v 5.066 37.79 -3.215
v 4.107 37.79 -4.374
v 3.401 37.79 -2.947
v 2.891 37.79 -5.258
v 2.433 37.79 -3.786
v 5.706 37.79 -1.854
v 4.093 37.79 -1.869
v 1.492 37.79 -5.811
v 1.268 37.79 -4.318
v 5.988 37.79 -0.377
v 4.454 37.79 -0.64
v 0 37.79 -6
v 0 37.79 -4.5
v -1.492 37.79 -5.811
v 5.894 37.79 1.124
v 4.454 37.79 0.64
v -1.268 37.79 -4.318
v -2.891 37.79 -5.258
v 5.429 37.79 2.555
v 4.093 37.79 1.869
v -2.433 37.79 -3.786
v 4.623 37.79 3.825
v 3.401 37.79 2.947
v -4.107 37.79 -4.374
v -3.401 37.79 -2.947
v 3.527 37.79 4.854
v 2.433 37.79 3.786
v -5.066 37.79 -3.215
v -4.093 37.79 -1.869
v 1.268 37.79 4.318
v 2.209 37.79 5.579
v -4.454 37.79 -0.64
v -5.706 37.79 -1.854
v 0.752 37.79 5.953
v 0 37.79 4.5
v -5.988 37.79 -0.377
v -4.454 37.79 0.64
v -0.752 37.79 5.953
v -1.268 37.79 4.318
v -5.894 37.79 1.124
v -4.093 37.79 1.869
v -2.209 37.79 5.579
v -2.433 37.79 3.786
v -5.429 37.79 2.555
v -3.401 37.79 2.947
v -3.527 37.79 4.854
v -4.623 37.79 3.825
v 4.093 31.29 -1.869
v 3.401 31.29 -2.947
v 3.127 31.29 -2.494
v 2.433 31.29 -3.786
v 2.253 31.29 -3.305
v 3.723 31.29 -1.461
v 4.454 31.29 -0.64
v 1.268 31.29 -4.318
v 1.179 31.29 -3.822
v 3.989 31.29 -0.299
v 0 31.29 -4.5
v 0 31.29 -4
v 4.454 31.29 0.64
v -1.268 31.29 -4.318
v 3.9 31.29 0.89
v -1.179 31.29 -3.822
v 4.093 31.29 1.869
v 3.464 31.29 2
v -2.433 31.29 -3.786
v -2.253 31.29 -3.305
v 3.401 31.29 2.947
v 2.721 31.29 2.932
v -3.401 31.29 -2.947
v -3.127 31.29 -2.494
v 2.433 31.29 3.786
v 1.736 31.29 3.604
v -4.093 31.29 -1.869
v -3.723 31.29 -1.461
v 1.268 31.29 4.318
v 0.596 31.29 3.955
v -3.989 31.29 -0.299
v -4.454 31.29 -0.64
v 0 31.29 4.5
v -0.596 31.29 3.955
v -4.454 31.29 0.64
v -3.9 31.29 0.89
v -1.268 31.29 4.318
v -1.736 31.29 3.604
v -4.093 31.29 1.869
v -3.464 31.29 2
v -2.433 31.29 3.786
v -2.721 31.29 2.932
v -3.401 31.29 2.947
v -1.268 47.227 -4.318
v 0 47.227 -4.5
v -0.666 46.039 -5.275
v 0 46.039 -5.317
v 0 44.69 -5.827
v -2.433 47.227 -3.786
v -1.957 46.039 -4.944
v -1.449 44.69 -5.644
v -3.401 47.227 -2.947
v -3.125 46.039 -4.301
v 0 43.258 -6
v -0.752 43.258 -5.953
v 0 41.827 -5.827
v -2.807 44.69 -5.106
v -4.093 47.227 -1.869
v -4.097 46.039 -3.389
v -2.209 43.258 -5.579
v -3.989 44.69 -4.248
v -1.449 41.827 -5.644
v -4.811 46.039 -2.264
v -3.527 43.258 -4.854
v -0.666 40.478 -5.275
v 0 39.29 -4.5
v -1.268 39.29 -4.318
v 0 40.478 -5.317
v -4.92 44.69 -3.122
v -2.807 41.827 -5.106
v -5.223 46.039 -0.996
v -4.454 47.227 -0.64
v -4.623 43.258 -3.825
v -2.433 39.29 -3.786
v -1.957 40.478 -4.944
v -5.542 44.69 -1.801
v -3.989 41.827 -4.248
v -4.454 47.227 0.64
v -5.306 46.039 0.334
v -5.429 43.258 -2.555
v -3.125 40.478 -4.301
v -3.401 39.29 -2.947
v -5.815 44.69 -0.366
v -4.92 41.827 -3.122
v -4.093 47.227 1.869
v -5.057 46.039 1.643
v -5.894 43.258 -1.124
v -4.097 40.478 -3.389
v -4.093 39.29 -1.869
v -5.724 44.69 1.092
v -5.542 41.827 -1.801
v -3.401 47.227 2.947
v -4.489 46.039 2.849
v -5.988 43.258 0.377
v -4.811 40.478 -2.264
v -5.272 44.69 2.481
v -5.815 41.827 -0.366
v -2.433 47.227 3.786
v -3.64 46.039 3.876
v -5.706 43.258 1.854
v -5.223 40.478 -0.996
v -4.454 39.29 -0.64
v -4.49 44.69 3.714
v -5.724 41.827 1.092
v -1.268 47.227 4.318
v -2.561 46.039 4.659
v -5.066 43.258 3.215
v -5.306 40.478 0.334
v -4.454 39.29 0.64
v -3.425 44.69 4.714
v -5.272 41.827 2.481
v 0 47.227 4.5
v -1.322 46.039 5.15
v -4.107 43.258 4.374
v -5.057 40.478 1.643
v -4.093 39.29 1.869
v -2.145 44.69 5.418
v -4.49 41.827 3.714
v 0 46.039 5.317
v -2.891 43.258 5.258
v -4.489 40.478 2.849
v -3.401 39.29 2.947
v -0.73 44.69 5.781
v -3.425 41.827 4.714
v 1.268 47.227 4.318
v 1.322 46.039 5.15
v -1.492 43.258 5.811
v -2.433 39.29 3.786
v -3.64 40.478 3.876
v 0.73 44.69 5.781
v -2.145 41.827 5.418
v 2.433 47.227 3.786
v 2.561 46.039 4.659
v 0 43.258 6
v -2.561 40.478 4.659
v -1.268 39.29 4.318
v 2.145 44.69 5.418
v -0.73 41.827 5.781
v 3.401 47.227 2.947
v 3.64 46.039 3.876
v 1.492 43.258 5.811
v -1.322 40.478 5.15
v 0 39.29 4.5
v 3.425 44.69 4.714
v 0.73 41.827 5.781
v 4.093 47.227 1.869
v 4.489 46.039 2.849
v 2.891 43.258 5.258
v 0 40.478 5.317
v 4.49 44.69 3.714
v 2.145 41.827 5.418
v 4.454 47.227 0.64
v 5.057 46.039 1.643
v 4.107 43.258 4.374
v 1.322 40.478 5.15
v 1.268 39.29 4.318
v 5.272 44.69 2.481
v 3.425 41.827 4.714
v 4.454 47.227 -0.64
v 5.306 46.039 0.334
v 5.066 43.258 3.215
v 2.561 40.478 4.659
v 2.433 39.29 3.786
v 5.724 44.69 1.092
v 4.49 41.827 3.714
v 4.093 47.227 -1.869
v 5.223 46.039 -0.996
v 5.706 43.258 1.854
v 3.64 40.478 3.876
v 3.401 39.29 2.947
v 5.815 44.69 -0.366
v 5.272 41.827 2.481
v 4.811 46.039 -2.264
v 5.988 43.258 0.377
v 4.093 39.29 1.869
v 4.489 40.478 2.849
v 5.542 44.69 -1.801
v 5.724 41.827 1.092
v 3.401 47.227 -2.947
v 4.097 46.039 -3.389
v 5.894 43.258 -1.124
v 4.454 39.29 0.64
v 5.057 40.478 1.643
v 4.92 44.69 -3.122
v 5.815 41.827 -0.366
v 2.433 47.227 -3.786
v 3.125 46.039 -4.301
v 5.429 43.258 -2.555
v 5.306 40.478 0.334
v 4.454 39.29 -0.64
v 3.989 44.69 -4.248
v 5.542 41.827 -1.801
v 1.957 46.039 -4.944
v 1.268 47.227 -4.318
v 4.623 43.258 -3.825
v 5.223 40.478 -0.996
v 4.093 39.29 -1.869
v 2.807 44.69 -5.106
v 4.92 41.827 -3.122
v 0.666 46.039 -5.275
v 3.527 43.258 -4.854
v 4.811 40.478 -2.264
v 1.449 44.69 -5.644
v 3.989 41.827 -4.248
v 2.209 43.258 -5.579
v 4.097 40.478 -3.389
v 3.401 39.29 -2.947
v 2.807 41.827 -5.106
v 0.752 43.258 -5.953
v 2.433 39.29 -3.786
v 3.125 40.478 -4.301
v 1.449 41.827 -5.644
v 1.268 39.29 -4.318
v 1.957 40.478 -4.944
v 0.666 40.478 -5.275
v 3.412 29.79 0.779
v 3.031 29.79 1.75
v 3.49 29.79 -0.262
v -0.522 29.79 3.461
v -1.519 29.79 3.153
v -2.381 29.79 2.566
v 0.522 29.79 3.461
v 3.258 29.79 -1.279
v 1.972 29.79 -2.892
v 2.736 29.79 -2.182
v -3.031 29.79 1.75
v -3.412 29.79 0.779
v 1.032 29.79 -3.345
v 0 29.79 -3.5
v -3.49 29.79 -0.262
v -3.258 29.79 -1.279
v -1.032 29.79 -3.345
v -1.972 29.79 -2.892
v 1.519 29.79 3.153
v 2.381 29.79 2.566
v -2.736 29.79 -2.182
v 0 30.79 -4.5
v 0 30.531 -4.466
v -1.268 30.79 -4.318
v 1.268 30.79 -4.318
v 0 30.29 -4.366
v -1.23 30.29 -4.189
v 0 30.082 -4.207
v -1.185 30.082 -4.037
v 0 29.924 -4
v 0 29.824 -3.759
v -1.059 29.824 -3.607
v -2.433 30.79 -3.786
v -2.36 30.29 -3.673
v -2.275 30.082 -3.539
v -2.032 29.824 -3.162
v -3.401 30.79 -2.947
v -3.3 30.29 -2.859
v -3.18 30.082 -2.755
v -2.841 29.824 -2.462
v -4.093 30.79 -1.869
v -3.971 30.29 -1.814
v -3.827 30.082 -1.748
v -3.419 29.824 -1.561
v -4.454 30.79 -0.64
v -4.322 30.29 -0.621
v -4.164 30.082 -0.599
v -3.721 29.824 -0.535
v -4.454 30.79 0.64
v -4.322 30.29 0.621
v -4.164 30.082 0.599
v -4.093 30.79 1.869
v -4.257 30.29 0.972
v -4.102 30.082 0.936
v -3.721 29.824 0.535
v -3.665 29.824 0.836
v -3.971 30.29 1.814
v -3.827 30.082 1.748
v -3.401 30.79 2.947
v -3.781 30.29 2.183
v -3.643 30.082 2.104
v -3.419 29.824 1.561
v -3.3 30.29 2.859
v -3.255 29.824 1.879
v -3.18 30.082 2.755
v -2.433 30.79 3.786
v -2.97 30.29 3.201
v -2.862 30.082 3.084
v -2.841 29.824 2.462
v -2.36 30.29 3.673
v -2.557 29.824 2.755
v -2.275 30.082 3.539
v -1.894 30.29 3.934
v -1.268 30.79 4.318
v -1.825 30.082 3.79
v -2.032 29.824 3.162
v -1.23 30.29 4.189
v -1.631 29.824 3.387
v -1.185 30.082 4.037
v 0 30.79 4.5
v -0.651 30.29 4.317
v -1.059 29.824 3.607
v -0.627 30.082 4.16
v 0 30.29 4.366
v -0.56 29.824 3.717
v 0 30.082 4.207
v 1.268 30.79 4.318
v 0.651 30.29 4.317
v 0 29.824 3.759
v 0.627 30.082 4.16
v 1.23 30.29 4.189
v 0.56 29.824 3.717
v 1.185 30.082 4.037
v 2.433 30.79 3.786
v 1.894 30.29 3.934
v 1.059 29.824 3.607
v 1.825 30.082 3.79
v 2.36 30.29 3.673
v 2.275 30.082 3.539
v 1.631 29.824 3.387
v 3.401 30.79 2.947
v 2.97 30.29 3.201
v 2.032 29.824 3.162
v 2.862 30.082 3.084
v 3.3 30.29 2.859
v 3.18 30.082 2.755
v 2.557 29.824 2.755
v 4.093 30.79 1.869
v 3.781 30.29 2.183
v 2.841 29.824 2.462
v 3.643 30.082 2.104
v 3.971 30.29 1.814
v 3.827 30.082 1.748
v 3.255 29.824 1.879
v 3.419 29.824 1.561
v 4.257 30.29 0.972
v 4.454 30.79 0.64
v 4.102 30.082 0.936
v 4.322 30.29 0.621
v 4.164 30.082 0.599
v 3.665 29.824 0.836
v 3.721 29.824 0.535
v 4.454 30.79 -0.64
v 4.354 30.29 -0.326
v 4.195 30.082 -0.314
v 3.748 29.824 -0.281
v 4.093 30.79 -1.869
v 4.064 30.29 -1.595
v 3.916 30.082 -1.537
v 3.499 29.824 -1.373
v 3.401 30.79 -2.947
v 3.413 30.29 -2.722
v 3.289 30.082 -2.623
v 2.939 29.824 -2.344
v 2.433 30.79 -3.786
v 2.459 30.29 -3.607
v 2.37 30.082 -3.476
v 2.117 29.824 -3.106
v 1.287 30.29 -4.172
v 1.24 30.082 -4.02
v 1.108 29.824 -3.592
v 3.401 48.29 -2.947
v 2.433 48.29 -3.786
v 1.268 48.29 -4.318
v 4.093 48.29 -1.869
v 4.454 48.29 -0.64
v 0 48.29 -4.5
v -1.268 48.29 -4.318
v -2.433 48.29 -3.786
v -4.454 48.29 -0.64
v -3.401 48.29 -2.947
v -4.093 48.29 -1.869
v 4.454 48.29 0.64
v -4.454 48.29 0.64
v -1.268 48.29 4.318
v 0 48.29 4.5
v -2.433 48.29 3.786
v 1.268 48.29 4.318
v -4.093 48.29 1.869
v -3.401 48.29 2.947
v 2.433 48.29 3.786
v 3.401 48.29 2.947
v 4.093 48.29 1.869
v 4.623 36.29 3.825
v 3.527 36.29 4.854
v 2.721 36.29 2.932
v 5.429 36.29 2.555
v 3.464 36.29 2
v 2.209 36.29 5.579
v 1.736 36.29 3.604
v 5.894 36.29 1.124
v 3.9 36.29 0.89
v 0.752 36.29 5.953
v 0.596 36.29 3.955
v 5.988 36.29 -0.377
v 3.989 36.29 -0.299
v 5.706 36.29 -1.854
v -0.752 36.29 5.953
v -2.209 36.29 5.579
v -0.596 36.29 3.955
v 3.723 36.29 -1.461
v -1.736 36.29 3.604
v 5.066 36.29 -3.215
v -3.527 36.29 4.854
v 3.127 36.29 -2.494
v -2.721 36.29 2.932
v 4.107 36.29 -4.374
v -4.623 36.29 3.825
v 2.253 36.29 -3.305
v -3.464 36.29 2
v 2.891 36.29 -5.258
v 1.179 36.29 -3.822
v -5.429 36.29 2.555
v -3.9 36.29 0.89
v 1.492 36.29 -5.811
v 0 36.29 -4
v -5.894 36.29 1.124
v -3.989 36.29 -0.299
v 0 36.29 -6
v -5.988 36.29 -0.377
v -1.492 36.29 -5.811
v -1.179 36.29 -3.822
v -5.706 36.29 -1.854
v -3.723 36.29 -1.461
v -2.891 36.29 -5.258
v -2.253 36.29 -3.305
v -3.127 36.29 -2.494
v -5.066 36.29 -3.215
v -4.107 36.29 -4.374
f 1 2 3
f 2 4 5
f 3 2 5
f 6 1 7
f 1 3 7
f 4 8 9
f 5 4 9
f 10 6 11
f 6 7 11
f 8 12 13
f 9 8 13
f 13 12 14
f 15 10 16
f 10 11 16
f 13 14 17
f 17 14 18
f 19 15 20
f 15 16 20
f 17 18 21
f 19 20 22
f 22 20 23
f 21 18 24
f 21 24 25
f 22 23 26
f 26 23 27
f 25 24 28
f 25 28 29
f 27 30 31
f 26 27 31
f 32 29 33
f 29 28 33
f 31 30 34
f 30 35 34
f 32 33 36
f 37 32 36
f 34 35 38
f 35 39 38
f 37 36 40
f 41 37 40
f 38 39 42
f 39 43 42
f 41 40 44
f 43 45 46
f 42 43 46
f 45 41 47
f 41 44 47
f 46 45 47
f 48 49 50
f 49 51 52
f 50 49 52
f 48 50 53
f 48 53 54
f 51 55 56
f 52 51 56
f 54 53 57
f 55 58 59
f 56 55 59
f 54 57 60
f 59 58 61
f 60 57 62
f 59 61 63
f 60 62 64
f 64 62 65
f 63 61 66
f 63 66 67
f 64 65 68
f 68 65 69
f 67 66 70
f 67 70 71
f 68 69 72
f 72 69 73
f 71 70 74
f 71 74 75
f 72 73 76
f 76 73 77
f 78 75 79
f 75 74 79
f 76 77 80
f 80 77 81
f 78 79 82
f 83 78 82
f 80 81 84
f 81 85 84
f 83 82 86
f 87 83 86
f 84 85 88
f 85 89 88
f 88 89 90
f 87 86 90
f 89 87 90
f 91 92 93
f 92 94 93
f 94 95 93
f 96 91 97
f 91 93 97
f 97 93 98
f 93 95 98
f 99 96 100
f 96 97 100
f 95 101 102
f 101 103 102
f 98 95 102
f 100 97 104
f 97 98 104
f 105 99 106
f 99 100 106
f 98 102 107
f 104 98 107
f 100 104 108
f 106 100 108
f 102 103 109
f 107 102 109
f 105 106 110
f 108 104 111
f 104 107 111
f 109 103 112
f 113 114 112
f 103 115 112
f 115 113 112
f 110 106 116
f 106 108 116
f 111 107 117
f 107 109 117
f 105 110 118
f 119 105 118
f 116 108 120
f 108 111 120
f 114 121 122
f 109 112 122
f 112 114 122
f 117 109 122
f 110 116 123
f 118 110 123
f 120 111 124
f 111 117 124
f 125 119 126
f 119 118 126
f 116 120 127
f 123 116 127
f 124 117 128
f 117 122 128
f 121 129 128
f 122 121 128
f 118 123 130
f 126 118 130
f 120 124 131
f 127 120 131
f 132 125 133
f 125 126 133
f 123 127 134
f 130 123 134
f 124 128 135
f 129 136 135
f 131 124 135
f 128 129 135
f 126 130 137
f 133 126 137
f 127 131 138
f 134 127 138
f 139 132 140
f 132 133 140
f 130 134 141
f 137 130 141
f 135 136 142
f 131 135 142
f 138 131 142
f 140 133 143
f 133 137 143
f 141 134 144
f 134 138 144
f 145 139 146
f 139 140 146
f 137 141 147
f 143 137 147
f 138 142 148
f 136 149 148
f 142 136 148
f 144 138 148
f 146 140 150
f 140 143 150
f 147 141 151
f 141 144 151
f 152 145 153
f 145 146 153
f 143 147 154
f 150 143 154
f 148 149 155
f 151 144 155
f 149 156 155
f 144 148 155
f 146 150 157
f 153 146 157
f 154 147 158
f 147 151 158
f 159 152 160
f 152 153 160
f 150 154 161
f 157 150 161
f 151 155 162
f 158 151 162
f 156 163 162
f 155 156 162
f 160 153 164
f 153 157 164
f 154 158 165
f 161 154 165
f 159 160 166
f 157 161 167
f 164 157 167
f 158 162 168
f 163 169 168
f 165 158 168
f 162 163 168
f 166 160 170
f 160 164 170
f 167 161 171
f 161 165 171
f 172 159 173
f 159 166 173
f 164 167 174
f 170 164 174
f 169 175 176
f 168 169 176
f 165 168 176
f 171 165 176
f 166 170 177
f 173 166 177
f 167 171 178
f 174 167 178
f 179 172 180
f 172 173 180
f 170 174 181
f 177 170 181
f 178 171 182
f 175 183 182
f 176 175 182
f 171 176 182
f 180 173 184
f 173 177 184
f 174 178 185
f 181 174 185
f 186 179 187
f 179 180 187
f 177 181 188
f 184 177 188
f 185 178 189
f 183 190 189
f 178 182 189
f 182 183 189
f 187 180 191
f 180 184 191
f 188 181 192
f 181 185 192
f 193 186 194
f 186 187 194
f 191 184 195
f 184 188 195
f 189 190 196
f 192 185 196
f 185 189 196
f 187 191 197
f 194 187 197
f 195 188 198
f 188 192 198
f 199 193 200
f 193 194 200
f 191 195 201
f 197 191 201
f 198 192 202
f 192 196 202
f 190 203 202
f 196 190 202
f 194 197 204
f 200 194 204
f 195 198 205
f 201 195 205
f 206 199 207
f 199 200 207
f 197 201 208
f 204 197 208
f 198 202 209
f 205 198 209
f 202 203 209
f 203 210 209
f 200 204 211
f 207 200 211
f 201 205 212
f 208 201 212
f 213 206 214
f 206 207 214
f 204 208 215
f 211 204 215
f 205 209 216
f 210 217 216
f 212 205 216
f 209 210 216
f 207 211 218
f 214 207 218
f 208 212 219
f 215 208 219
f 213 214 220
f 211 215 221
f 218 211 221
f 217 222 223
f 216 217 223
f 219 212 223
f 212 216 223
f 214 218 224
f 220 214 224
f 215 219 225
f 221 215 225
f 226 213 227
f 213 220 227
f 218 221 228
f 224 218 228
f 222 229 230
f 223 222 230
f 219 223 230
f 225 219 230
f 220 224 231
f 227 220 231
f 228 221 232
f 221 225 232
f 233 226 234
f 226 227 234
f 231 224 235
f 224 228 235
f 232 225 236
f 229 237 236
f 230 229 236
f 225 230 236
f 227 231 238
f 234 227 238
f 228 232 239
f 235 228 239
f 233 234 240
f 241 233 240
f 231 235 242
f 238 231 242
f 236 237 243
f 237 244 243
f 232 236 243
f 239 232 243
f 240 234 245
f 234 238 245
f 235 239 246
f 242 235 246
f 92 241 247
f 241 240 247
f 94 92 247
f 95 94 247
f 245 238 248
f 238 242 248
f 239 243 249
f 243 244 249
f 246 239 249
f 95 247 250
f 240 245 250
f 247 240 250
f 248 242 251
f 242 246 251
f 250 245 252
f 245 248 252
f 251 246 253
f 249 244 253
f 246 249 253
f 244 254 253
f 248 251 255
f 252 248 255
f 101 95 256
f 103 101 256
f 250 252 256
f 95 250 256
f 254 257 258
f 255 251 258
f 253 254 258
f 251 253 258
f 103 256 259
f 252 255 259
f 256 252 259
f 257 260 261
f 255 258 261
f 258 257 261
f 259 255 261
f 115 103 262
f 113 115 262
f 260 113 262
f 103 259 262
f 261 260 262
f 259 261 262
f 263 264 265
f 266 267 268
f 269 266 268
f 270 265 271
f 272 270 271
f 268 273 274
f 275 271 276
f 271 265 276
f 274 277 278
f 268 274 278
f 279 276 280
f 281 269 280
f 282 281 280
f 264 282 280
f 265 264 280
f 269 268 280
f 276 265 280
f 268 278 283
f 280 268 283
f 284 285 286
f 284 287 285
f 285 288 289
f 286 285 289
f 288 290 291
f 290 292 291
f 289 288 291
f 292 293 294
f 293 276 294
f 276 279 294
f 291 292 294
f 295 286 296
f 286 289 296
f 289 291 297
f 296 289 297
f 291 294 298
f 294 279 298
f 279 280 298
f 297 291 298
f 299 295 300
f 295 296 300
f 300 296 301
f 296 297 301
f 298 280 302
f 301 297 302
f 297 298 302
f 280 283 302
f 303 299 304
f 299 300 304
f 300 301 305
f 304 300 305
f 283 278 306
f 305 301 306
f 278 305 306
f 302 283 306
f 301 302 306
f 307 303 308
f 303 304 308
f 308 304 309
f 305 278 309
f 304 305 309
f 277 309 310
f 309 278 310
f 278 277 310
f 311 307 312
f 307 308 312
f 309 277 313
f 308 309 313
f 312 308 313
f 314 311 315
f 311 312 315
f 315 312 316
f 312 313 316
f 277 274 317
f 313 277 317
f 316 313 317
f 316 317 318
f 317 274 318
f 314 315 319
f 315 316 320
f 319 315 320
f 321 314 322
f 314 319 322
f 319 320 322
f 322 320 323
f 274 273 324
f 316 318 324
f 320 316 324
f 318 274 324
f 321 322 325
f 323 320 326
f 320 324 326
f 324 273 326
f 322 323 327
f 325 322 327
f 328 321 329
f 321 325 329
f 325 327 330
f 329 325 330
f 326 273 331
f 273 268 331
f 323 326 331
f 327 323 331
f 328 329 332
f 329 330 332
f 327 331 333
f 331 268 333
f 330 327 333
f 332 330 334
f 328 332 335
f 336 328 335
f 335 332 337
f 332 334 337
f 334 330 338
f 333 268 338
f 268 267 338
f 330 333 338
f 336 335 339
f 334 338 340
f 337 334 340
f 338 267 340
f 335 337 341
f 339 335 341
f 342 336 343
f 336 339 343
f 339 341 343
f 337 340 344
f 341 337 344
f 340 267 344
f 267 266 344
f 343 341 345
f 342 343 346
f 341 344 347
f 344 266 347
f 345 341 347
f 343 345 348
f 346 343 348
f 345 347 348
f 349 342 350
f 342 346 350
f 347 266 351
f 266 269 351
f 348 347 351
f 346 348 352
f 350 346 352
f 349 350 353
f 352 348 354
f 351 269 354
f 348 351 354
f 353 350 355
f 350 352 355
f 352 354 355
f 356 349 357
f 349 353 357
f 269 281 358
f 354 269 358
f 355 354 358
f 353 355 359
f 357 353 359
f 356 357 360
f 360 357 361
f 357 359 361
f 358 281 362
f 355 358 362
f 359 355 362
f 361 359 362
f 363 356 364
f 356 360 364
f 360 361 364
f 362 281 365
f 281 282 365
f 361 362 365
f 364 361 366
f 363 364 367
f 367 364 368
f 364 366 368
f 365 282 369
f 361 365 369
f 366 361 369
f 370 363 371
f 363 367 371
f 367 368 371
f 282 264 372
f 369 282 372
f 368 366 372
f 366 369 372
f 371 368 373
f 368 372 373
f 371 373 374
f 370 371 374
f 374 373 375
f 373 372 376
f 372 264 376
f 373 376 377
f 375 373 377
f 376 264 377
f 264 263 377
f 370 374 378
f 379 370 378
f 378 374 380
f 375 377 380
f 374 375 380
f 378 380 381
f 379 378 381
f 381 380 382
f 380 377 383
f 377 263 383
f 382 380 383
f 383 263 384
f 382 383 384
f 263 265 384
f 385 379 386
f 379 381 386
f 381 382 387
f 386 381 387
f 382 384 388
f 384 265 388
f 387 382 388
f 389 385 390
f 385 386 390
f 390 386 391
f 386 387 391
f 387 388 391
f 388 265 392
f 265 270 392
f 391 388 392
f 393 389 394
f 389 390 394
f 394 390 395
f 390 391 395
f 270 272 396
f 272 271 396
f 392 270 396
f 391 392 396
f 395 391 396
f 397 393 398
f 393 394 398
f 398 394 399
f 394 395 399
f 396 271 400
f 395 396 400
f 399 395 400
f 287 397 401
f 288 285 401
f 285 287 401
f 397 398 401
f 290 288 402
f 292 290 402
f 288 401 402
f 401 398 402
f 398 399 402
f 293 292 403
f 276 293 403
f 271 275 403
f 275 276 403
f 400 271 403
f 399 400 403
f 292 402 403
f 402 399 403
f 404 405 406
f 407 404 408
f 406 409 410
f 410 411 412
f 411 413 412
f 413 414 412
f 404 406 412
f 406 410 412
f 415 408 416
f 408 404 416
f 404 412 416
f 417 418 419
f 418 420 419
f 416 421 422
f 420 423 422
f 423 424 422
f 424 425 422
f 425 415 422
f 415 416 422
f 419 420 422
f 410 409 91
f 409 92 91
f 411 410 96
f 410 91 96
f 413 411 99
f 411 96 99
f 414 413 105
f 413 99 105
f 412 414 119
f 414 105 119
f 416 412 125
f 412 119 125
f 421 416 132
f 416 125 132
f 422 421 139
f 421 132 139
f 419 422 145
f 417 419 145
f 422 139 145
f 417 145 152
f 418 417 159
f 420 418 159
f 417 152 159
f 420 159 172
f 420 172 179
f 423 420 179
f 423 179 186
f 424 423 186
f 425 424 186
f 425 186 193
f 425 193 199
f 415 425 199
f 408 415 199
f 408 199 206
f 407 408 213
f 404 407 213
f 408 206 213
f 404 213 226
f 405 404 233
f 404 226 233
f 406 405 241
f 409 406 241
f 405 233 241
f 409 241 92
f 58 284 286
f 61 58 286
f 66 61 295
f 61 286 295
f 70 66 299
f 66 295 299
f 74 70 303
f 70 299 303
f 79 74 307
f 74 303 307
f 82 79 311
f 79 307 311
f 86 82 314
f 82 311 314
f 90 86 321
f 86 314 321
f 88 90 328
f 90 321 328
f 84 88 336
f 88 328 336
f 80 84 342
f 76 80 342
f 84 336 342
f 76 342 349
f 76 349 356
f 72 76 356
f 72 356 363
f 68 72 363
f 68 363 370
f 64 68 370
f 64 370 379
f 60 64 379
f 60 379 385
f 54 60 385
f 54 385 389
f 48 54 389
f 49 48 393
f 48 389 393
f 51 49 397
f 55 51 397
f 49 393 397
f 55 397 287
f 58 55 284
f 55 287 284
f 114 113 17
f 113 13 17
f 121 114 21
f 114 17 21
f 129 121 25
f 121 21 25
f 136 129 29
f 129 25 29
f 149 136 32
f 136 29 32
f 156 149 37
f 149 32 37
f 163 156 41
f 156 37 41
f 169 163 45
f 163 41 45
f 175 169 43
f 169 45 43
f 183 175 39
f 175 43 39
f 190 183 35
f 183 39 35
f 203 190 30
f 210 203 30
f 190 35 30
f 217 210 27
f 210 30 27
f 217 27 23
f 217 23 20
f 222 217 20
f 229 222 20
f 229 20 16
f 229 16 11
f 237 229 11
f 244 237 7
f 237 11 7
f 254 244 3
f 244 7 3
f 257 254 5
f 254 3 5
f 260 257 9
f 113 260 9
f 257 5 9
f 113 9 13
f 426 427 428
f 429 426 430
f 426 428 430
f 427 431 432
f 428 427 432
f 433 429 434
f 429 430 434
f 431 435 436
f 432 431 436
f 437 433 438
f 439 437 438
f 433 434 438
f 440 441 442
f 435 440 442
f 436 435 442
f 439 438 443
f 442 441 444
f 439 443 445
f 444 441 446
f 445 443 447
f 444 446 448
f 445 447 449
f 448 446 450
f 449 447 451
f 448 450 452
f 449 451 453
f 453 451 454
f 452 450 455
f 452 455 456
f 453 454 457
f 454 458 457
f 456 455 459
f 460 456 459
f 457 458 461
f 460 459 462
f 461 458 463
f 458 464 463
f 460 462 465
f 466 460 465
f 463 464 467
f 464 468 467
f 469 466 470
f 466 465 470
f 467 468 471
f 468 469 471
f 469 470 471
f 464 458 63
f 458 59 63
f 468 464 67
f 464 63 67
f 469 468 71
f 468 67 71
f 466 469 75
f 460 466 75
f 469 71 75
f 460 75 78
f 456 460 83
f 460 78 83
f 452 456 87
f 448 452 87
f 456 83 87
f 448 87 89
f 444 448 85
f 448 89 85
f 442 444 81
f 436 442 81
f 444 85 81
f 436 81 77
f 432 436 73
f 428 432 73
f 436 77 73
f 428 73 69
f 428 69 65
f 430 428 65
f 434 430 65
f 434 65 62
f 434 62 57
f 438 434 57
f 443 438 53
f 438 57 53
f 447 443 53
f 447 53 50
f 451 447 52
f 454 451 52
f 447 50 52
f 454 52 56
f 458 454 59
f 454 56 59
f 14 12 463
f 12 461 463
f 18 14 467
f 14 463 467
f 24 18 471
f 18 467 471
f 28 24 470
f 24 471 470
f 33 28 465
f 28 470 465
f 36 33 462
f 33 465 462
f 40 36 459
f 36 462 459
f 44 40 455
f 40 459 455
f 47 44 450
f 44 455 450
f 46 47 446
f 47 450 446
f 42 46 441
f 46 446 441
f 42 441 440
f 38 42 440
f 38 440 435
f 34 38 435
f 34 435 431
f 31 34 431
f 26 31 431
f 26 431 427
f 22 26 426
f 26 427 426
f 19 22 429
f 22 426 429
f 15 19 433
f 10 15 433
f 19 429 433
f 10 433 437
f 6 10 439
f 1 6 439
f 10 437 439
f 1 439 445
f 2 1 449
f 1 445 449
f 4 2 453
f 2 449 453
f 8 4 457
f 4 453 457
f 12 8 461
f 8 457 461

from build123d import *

# Parameters (mm, degrees)
CONG_1_R = 1


with BuildPart() as part:
    # Esquisse1 → Révolution1 (revolve)
    with BuildSketch(Plane.XY, mode=Mode.PRIVATE) as r_volution1_sk:
        with BuildLine():
            Line((-4.5, 39.289558898), (-4.5, 37.789558898))
            Line((-4.5, 37.789558898), (-6, 37.789558898))
            Line((-6, 37.789558898), (-6, 36.289558898))
            Line((-6, 36.289558898), (-4, 36.289558898))
            Line((-4, 36.289558898), (-4, 31.289558898))
            Line((-4, 31.289558898), (-4.5, 31.289558898))
            Line((-4.5, 31.289558898), (-4.5, 29.789558898))
            Line((-4.5, 29.789558898), (0, 29.789558898))
            Line((0, 29.789558898), (0, 48.289558898))
            Line((0, 48.289558898), (-4.5, 48.289558898))
            Line((-4.5, 48.289558898), (-4.5, 47.226812831))
            ThreePointArc((-4.5, 47.226812831), (-6, 43.258185864), (-4.5, 39.289558898))
        make_face()
    revolve(r_volution1_sk.sketch.rotate(Axis((0, 0, 0), (0, 1, 0)), 270), axis=Axis((0, 0, 0), (0, 1, 0)))

    # Congé1
    cong_1_edges = [part.edges().sort_by_distance(p)[0] for p in [
        (0, 29.789558898, 4.5),
    ]]
    fillet(cong_1_edges, radius=CONG_1_R)


solid = part.part
